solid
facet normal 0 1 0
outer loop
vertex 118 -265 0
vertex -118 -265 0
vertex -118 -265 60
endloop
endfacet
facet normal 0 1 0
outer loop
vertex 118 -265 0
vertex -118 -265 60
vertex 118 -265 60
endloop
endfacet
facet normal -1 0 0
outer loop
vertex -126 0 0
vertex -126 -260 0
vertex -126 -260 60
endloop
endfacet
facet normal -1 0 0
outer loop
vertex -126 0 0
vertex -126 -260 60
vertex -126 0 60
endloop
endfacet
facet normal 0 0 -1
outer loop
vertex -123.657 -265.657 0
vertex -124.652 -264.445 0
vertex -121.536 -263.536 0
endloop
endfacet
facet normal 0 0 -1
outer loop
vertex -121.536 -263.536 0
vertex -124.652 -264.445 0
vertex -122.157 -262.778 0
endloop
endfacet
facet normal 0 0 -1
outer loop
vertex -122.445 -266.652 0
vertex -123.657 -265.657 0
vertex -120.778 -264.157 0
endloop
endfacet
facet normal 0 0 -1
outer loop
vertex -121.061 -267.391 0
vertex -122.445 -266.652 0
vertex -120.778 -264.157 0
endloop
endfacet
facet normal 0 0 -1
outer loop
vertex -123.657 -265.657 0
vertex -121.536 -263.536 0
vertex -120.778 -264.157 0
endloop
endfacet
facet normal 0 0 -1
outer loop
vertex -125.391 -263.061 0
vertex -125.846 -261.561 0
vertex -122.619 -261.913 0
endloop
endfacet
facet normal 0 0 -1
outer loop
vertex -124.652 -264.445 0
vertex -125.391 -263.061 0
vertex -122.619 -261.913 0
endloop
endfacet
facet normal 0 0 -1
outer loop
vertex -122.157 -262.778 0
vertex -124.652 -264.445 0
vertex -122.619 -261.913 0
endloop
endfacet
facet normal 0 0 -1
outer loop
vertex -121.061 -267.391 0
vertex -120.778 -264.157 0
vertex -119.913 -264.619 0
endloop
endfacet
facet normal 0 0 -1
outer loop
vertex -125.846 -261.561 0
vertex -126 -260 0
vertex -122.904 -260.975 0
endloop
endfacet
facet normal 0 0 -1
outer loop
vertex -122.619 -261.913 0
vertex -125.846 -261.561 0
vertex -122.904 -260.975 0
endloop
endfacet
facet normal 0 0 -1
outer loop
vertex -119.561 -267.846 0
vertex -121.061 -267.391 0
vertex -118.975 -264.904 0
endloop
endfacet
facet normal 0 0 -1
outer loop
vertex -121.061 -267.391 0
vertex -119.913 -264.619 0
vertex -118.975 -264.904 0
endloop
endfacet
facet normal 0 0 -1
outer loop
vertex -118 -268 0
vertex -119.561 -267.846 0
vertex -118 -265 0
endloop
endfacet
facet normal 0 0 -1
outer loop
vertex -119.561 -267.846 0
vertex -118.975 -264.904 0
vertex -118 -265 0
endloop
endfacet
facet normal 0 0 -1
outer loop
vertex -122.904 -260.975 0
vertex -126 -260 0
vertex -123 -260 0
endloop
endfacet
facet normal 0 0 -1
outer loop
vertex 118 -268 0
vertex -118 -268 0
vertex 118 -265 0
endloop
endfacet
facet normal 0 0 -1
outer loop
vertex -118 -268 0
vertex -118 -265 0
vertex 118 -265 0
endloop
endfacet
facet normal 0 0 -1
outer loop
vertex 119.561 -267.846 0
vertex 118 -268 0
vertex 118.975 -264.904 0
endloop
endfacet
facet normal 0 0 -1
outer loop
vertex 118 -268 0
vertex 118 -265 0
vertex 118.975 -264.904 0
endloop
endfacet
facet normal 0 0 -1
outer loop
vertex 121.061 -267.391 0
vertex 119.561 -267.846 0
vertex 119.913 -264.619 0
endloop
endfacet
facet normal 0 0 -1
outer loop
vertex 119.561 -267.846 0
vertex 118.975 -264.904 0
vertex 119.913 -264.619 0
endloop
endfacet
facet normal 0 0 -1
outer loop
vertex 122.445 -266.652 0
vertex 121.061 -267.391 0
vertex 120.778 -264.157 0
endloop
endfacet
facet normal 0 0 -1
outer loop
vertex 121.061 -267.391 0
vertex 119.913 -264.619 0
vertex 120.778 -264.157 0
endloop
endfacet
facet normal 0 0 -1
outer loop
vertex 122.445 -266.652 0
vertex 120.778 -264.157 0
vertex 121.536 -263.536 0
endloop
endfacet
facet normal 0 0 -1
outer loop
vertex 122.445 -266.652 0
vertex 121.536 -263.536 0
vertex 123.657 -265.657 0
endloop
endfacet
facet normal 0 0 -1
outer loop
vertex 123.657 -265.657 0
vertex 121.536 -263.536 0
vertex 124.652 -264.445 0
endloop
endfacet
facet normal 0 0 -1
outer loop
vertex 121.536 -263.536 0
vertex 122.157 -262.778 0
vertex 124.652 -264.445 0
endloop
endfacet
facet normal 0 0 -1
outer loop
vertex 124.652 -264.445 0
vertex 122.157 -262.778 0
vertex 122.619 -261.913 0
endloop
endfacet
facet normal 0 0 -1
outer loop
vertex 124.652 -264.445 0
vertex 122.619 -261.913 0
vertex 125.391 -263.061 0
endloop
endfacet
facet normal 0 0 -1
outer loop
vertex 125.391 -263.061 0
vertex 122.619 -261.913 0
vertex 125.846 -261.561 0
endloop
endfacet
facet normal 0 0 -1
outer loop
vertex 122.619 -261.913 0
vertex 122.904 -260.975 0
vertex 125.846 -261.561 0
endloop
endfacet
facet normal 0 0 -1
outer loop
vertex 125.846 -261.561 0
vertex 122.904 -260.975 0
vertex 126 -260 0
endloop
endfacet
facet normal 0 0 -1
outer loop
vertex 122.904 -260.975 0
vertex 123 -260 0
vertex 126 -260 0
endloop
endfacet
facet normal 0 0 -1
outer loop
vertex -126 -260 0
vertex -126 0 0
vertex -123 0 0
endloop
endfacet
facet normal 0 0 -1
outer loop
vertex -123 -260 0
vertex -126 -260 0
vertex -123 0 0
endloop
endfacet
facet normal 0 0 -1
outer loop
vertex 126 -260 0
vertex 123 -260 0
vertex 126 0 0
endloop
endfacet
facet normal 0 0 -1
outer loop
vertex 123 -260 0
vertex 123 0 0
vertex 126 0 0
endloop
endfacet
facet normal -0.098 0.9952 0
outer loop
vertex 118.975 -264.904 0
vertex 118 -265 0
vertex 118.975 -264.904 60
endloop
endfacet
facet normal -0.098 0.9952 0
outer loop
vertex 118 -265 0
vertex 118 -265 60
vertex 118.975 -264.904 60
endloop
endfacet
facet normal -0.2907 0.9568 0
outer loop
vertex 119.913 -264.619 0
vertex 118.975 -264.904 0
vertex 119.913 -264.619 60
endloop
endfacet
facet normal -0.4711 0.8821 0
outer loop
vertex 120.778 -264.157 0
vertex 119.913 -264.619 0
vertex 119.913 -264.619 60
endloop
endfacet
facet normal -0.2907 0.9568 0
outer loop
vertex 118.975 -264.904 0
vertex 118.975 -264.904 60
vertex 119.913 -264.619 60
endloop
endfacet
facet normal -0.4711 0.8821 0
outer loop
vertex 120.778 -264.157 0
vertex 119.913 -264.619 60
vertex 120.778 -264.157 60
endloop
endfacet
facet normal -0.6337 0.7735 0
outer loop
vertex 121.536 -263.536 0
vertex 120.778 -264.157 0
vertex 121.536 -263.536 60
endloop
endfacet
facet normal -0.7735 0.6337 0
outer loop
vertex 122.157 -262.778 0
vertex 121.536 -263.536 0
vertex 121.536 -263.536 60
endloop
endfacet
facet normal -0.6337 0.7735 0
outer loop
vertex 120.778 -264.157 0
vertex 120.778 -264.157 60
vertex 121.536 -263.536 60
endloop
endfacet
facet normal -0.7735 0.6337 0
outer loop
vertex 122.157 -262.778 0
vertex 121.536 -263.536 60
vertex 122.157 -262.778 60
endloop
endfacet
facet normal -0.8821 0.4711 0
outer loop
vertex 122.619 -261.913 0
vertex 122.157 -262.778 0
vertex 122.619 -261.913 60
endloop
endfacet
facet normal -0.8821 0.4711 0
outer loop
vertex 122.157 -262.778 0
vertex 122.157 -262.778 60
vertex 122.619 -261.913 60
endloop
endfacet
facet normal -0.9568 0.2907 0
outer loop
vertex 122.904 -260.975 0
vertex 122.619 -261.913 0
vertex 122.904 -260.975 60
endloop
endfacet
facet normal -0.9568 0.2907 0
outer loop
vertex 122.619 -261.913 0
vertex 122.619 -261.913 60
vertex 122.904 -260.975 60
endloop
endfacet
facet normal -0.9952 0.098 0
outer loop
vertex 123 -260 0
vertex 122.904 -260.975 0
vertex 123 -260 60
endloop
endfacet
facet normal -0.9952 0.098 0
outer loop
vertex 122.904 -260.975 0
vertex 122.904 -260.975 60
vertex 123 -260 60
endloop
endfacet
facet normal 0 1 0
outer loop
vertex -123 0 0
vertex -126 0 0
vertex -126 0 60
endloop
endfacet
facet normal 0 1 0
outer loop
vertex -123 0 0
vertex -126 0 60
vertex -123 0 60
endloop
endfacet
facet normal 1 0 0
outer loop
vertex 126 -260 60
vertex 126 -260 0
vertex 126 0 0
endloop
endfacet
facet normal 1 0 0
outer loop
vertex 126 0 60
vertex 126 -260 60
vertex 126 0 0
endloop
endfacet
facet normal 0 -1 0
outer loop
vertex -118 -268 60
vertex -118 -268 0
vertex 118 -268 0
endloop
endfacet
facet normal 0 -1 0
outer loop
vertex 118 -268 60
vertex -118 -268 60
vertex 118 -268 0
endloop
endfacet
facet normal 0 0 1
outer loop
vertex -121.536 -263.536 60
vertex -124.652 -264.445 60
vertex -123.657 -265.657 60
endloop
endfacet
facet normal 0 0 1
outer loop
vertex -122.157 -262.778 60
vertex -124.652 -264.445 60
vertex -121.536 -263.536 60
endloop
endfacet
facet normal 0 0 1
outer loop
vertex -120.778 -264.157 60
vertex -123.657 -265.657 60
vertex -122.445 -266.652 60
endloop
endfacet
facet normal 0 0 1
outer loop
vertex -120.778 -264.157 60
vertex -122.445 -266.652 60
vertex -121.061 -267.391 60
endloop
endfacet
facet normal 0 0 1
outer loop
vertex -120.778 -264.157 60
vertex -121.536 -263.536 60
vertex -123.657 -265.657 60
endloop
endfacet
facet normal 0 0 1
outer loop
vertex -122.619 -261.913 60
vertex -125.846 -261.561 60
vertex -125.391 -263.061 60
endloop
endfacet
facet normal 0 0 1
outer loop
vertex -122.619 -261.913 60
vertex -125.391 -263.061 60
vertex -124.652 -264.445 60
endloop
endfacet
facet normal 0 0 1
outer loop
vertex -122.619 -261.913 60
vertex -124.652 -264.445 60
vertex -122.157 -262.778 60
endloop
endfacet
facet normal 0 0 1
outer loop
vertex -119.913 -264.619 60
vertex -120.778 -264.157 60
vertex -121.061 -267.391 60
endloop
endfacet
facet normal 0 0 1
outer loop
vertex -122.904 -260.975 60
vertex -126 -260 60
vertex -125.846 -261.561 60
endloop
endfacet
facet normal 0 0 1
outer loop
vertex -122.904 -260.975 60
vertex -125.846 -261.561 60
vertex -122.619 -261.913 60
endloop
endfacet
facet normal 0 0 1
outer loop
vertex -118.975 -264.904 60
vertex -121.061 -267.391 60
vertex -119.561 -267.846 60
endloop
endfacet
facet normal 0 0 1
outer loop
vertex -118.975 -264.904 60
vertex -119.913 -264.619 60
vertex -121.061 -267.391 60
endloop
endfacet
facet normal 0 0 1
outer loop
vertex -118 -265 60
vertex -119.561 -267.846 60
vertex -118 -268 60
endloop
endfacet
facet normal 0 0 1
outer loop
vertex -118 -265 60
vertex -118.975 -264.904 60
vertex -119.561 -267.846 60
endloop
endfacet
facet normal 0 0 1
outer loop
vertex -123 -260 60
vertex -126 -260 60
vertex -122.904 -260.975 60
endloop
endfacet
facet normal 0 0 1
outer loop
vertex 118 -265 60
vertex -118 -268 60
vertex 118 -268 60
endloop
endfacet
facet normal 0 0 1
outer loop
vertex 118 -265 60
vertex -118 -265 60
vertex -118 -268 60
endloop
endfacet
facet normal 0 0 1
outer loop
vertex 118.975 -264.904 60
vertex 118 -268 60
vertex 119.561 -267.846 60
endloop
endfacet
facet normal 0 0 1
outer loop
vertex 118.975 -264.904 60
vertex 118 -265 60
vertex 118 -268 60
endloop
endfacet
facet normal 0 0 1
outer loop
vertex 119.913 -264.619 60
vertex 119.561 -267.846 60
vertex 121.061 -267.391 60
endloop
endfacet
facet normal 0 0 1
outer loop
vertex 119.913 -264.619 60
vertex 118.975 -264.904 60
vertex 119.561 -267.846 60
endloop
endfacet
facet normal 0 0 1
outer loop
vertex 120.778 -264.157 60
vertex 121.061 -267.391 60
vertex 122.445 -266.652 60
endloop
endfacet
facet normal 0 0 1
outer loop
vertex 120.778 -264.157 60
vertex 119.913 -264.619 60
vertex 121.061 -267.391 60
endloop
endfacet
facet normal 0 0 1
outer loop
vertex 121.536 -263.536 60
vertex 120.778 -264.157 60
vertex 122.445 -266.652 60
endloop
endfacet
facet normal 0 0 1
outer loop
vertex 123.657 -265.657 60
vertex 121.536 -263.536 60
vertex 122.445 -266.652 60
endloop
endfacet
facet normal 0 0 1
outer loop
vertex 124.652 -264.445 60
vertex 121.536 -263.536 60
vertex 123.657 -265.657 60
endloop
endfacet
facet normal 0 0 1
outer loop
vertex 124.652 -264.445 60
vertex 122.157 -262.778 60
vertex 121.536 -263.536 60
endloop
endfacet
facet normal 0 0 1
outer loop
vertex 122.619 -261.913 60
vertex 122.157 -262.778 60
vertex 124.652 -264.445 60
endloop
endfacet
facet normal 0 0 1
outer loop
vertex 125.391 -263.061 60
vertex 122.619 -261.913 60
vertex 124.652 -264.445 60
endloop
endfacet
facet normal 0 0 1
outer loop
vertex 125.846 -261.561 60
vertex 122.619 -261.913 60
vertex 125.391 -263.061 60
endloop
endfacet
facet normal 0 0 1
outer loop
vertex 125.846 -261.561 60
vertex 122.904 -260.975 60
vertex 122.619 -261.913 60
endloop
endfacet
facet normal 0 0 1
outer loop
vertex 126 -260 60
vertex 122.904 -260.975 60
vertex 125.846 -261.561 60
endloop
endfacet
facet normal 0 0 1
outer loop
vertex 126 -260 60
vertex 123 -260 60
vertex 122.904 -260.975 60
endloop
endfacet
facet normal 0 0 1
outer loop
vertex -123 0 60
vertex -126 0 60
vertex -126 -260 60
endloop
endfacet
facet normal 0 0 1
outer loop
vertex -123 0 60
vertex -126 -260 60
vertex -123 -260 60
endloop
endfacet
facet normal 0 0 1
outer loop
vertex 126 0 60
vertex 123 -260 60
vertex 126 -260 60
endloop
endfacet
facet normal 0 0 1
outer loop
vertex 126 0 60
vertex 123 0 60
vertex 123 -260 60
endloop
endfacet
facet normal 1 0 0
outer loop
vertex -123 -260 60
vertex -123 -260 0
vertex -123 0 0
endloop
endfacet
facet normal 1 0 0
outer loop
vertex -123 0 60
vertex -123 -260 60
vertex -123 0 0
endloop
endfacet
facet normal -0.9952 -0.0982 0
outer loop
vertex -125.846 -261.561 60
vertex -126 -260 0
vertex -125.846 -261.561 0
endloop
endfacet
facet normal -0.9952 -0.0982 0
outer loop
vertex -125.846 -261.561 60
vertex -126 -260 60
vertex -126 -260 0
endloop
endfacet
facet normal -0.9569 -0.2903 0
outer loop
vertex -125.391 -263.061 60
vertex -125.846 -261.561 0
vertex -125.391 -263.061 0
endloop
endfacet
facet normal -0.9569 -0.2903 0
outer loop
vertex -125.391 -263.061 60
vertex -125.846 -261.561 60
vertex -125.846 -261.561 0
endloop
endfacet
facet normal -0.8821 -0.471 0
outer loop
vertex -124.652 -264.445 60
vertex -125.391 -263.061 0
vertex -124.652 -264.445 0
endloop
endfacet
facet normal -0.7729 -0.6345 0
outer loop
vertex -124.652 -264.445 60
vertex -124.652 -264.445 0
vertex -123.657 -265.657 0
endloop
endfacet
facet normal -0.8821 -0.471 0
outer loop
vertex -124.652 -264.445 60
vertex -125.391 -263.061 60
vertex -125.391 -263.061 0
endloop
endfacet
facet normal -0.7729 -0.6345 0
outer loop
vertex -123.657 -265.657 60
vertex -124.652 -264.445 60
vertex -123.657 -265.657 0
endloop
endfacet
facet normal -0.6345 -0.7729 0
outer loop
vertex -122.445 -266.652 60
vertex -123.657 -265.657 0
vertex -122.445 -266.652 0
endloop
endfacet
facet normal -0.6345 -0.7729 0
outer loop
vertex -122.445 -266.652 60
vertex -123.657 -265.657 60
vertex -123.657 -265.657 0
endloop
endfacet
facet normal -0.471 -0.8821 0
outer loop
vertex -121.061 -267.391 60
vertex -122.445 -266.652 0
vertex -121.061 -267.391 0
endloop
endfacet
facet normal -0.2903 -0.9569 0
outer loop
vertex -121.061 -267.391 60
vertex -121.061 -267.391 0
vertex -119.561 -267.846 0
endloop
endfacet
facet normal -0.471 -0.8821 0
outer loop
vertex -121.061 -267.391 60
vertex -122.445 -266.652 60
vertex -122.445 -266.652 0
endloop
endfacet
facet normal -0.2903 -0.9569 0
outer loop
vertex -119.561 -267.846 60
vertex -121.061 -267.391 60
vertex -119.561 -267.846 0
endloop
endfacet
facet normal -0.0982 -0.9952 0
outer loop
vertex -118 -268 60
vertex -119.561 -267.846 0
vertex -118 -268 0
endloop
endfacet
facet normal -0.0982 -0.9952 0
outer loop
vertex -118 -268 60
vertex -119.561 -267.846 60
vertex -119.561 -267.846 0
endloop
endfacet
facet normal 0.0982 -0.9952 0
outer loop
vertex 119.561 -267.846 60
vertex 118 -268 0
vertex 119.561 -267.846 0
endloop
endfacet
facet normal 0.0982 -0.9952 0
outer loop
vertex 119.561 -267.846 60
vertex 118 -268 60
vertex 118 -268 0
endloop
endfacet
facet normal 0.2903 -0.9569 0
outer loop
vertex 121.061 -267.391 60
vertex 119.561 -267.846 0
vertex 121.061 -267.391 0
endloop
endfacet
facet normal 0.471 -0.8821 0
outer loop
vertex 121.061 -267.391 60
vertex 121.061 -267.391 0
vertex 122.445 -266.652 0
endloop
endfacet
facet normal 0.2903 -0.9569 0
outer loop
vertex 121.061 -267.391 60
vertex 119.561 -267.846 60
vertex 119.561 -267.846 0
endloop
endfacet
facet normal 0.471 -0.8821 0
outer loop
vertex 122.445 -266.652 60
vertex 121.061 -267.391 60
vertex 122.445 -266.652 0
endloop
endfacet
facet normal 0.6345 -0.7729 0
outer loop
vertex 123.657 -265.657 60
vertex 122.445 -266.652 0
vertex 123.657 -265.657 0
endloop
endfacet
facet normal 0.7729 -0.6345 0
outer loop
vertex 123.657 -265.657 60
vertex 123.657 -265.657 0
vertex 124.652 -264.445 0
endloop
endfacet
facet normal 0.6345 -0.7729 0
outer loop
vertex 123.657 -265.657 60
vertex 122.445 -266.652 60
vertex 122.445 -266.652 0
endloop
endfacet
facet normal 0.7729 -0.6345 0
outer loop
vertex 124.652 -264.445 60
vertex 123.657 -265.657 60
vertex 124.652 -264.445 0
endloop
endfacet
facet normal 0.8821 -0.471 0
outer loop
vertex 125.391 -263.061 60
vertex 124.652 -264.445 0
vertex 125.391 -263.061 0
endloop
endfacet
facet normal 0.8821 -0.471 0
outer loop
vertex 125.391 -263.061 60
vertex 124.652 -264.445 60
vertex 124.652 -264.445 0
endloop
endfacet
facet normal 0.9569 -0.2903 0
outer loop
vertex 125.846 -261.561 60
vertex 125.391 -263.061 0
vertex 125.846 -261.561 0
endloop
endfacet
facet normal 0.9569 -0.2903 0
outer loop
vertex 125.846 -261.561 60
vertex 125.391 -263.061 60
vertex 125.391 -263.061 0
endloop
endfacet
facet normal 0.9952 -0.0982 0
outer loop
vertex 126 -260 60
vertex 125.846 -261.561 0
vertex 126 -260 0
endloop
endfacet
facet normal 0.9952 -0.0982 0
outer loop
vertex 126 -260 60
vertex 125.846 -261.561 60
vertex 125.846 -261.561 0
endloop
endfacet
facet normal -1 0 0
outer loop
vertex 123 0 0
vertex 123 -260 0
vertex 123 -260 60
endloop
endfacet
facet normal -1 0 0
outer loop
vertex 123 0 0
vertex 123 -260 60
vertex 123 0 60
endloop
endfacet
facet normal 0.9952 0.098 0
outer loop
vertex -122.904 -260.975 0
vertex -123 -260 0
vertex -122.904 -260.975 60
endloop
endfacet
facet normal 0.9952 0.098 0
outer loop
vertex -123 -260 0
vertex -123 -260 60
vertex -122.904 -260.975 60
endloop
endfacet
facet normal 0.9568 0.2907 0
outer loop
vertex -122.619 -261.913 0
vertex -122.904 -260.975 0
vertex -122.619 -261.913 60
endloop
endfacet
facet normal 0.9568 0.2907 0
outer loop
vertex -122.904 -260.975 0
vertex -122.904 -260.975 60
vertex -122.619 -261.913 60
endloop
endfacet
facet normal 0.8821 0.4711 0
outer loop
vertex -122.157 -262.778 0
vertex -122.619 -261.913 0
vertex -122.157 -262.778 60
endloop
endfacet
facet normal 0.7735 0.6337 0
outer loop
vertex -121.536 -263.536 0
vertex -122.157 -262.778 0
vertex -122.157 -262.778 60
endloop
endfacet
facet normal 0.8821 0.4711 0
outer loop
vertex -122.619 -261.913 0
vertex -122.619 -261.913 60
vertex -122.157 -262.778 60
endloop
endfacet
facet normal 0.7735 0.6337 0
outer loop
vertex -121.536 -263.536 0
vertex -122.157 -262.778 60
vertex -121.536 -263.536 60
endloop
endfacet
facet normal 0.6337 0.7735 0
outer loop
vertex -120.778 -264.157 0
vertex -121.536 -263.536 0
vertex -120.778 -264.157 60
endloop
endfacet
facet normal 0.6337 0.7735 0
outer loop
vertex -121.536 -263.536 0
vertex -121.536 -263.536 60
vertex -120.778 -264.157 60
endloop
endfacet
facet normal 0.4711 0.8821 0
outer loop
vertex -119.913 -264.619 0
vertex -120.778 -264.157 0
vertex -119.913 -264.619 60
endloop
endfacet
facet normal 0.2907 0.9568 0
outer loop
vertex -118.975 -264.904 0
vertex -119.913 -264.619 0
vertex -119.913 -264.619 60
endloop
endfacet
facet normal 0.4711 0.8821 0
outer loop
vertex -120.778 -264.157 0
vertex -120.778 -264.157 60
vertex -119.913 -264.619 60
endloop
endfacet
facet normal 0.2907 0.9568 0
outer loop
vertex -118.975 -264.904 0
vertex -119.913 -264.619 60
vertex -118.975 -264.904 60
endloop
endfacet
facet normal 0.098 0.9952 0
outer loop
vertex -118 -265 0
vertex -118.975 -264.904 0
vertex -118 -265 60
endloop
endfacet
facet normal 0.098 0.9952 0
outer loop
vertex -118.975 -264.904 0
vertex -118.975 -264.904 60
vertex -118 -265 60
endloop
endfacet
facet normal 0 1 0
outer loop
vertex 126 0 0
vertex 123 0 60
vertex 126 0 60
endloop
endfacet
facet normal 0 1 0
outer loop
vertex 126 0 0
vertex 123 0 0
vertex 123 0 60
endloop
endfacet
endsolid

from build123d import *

# Parameters (mm, degrees)
SKETCH005_W    = 252
SKETCH005_H    = 268
PAD005_DEPTH   = 60
FILLET003_R    = 8
THICKNESS001_T = -3


with BuildPart() as part:
    # Sketch005 → Pad005 (new body)
    with BuildSketch(Plane.XY):
        with Locations((0, -134)):
            Rectangle(SKETCH005_W, SKETCH005_H)
    extrude(amount=PAD005_DEPTH)

    # Fillet003
    fillet003_edges = [part.edges().sort_by_distance(p)[0] for p in [
        (126, -268, 30),
        (-126, -268, 30),
    ]]
    fillet(fillet003_edges, radius=FILLET003_R)

    # Thickness001
    thickness001_openings = [part.faces().sort_by_distance(p)[0] for p in [
        (0, -133.946203, 60),
        (0, 0, 30),
        (0, -133.946203, 0),
    ]]
    offset(amount=THICKNESS001_T, openings=thickness001_openings)


solid = part.part
